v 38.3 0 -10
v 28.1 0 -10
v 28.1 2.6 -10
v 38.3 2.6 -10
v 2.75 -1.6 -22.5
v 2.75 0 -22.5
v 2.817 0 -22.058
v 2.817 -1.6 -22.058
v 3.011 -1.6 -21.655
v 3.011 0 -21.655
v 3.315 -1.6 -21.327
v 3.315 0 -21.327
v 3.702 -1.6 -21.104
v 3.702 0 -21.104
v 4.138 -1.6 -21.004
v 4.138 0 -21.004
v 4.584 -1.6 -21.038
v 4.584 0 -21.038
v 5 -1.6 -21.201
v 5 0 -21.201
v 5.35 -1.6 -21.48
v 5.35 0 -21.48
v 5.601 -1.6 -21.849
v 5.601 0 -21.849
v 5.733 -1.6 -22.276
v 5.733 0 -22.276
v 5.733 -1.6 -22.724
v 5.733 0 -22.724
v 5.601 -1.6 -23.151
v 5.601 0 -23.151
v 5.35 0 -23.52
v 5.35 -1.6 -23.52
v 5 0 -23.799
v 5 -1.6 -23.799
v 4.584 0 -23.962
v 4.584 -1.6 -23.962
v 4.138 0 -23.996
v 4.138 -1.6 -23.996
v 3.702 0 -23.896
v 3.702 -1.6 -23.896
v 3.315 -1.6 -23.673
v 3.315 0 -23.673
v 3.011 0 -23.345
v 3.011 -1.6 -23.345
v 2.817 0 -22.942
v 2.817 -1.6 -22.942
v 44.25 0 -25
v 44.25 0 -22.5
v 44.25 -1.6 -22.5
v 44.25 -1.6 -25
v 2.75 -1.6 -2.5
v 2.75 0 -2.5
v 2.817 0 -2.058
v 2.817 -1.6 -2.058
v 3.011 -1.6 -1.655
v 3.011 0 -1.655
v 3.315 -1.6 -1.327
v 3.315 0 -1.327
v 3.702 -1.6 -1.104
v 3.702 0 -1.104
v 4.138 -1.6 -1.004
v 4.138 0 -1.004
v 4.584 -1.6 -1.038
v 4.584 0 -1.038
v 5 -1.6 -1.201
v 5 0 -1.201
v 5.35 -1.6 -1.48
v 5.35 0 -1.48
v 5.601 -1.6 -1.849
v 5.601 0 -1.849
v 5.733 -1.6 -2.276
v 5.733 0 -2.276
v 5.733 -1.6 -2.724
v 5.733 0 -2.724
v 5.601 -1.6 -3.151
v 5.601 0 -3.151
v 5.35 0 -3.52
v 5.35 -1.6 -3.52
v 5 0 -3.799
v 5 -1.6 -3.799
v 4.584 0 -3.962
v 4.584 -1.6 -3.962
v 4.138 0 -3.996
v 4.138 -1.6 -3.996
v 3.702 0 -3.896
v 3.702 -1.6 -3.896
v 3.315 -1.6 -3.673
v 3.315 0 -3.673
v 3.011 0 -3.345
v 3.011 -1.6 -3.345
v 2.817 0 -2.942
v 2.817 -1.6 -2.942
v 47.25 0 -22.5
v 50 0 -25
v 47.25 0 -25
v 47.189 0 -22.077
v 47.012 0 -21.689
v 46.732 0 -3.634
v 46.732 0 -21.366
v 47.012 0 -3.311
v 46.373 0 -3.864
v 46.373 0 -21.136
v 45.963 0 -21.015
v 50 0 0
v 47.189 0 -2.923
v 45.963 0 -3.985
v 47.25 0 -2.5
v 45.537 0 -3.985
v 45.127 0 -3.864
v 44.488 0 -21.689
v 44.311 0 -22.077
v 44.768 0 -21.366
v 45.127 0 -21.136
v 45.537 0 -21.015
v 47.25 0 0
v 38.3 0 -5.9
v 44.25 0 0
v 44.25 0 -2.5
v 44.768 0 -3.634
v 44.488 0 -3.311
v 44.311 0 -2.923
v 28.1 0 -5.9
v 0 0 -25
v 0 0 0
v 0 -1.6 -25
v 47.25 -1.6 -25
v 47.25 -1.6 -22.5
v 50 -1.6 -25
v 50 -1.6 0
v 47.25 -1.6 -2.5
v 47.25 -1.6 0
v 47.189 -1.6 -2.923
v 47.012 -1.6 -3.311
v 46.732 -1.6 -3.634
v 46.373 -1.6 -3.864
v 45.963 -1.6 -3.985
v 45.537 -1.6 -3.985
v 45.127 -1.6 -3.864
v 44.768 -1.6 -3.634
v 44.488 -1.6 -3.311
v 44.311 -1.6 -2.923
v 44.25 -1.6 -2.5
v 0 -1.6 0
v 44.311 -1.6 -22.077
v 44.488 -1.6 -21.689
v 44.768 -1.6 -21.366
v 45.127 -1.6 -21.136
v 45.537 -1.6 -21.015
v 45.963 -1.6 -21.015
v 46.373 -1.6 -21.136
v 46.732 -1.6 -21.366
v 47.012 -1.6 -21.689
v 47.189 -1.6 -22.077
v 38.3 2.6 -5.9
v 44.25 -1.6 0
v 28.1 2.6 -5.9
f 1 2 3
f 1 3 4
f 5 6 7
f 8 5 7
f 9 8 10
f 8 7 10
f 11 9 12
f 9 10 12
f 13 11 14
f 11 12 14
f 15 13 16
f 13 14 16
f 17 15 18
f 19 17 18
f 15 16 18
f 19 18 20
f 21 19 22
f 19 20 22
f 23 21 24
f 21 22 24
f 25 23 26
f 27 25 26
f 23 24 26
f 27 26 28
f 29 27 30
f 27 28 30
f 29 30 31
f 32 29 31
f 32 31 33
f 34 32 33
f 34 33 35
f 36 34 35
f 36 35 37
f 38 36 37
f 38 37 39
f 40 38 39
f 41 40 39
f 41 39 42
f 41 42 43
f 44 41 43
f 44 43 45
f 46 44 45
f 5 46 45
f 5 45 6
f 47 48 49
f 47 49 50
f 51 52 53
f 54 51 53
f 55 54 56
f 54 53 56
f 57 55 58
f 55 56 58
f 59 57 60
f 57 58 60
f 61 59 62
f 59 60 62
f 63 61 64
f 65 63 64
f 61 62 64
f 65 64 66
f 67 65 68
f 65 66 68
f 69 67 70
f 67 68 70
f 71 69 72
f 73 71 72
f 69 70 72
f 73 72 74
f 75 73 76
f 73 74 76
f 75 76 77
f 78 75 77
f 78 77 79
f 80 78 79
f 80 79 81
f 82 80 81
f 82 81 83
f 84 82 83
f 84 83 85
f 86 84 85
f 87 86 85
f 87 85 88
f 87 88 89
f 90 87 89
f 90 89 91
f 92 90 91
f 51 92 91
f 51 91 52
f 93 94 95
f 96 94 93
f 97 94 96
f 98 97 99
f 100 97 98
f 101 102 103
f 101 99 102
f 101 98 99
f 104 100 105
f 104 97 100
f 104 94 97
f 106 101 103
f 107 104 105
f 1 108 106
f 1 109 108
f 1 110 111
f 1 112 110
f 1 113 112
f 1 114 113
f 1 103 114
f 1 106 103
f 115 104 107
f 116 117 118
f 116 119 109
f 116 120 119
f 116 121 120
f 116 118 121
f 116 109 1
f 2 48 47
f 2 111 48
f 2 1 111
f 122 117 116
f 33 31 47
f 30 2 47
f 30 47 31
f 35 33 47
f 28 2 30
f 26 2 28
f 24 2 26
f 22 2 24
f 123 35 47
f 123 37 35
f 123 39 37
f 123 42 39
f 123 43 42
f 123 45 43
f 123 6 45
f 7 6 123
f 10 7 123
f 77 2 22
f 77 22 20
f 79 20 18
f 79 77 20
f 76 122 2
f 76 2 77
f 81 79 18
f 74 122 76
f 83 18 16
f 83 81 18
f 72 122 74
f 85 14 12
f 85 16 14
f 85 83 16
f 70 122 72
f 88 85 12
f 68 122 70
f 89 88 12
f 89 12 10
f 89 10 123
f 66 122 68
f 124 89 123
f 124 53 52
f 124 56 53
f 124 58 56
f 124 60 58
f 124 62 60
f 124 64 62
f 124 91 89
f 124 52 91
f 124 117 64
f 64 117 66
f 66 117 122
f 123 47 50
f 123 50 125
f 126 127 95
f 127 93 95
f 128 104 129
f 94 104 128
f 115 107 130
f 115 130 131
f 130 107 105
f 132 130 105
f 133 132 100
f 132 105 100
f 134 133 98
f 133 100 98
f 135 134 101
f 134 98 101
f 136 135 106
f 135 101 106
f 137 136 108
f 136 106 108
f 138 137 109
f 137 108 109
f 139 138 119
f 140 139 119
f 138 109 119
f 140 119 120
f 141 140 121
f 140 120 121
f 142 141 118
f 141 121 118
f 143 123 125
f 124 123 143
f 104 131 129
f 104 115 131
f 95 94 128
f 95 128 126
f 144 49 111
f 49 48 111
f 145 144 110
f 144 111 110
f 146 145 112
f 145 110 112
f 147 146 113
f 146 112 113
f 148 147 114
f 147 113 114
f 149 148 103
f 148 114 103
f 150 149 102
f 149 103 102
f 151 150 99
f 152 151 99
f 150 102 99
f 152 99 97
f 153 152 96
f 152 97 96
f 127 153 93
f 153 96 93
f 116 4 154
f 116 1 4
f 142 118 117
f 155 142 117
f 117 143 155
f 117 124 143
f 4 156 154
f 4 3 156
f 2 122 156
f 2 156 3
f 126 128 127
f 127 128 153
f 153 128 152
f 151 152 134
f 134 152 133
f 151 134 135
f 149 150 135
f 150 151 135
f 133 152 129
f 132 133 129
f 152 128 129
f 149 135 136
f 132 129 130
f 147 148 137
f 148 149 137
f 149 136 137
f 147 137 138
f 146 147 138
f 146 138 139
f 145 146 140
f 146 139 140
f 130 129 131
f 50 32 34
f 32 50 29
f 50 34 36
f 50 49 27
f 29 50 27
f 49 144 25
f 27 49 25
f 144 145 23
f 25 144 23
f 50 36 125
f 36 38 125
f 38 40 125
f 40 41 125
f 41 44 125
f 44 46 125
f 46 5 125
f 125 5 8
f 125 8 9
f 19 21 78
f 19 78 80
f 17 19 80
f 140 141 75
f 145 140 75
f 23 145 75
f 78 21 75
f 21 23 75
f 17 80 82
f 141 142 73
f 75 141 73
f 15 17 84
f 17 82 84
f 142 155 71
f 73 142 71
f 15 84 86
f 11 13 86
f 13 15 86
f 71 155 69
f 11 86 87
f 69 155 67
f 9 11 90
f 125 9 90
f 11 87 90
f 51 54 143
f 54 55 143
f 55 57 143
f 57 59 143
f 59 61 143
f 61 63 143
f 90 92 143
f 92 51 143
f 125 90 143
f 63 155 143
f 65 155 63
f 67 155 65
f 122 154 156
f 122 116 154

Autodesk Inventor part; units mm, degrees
ref_plane "YZ Plane" through (0, 0, 0) normal (1, 0, 0) x (0, 1, 0)
ref_plane "XZ Plane" through (0, 0, 0) normal (0, 1, 0) x (-1, 0, 0)
ref_plane "XY Plane" through (0, 0, 0) normal (0, 0, 1) x (1, 0, 0)
sketch "Sketch1" plane through (0, 0, 0) normal (0, 1, 0) x (-1, 0, 0)
  line L0 (-50, 0) -> (-50, -25)
  line L1 (0, -25) -> (0, 0)
  circle A0 centre (-4.25, -22.5) radius 1.5
  circle A1 centre (-4.25, -2.5) radius 1.5
  arc A2 (-44.25, -22.5) -> (-47.25, -22.5) centre (-45.75, -22.5) ccw
  arc A3 (-47.25, -2.5) -> (-44.25, -2.5) centre (-45.75, -2.5) ccw
  line L2 (0, -12.5) -> (-50, -12.5) construction
  line L3 (-25, -25) -> (-25, 0) construction
  line L4 (-44.25, -22.5) -> (-44.25, -25)
  line L5 (-47.25, -22.5) -> (-47.25, -25)
  line L6 (-44.25, -2.5) -> (-44.25, 0)
  line L7 (-47.25, -2.5) -> (-47.25, 0)
  line L8 (0, 0) -> (-44.25, 0)
  line L9 (-47.25, 0) -> (-50, 0)
  line L10 (-50, -25) -> (-47.25, -25)
  line L11 (-44.25, -25) -> (0, -25)
  dimension "d0" = 50
  dimension "d1" = 25
  dimension "d2" = 3
  dimension "d3" = 3
  dimension "d4" = 3
  dimension "d5" = 3
  dimension "d7" = 41.5
  dimension "d8" = 20
  dimension "d9" = 10
  dimension "d10" = 20.75
extrude "Extrusion1" add sketch "Sketch1" against normal blind 1.6
sketch "Sketch2" plane through (0, 0, 0) normal (0, 1, 0) x (1, 0, 0)
  line L0 (38.3, 5.9) -> (28.1, 5.9)
  line L1 (28.1, 5.9) -> (28.1, 10)
  line L2 (28.1, 10) -> (38.3, 10)
  line L3 (38.3, 10) -> (38.3, 5.9)
  line L4 (44.25, 0) -> (0, 0) construction
  line L5 (50, 25) -> (50, 0) construction
  dimension "d13" = 10.2
  dimension "d14" = 4.1
  dimension "d15" = 5.9
  dimension "d16" = 11.7
extrude "Extrusion2" add sketch "Sketch2" along normal blind 2.6
properties part number "basecam_simpleBCG_32bit_tiny"
